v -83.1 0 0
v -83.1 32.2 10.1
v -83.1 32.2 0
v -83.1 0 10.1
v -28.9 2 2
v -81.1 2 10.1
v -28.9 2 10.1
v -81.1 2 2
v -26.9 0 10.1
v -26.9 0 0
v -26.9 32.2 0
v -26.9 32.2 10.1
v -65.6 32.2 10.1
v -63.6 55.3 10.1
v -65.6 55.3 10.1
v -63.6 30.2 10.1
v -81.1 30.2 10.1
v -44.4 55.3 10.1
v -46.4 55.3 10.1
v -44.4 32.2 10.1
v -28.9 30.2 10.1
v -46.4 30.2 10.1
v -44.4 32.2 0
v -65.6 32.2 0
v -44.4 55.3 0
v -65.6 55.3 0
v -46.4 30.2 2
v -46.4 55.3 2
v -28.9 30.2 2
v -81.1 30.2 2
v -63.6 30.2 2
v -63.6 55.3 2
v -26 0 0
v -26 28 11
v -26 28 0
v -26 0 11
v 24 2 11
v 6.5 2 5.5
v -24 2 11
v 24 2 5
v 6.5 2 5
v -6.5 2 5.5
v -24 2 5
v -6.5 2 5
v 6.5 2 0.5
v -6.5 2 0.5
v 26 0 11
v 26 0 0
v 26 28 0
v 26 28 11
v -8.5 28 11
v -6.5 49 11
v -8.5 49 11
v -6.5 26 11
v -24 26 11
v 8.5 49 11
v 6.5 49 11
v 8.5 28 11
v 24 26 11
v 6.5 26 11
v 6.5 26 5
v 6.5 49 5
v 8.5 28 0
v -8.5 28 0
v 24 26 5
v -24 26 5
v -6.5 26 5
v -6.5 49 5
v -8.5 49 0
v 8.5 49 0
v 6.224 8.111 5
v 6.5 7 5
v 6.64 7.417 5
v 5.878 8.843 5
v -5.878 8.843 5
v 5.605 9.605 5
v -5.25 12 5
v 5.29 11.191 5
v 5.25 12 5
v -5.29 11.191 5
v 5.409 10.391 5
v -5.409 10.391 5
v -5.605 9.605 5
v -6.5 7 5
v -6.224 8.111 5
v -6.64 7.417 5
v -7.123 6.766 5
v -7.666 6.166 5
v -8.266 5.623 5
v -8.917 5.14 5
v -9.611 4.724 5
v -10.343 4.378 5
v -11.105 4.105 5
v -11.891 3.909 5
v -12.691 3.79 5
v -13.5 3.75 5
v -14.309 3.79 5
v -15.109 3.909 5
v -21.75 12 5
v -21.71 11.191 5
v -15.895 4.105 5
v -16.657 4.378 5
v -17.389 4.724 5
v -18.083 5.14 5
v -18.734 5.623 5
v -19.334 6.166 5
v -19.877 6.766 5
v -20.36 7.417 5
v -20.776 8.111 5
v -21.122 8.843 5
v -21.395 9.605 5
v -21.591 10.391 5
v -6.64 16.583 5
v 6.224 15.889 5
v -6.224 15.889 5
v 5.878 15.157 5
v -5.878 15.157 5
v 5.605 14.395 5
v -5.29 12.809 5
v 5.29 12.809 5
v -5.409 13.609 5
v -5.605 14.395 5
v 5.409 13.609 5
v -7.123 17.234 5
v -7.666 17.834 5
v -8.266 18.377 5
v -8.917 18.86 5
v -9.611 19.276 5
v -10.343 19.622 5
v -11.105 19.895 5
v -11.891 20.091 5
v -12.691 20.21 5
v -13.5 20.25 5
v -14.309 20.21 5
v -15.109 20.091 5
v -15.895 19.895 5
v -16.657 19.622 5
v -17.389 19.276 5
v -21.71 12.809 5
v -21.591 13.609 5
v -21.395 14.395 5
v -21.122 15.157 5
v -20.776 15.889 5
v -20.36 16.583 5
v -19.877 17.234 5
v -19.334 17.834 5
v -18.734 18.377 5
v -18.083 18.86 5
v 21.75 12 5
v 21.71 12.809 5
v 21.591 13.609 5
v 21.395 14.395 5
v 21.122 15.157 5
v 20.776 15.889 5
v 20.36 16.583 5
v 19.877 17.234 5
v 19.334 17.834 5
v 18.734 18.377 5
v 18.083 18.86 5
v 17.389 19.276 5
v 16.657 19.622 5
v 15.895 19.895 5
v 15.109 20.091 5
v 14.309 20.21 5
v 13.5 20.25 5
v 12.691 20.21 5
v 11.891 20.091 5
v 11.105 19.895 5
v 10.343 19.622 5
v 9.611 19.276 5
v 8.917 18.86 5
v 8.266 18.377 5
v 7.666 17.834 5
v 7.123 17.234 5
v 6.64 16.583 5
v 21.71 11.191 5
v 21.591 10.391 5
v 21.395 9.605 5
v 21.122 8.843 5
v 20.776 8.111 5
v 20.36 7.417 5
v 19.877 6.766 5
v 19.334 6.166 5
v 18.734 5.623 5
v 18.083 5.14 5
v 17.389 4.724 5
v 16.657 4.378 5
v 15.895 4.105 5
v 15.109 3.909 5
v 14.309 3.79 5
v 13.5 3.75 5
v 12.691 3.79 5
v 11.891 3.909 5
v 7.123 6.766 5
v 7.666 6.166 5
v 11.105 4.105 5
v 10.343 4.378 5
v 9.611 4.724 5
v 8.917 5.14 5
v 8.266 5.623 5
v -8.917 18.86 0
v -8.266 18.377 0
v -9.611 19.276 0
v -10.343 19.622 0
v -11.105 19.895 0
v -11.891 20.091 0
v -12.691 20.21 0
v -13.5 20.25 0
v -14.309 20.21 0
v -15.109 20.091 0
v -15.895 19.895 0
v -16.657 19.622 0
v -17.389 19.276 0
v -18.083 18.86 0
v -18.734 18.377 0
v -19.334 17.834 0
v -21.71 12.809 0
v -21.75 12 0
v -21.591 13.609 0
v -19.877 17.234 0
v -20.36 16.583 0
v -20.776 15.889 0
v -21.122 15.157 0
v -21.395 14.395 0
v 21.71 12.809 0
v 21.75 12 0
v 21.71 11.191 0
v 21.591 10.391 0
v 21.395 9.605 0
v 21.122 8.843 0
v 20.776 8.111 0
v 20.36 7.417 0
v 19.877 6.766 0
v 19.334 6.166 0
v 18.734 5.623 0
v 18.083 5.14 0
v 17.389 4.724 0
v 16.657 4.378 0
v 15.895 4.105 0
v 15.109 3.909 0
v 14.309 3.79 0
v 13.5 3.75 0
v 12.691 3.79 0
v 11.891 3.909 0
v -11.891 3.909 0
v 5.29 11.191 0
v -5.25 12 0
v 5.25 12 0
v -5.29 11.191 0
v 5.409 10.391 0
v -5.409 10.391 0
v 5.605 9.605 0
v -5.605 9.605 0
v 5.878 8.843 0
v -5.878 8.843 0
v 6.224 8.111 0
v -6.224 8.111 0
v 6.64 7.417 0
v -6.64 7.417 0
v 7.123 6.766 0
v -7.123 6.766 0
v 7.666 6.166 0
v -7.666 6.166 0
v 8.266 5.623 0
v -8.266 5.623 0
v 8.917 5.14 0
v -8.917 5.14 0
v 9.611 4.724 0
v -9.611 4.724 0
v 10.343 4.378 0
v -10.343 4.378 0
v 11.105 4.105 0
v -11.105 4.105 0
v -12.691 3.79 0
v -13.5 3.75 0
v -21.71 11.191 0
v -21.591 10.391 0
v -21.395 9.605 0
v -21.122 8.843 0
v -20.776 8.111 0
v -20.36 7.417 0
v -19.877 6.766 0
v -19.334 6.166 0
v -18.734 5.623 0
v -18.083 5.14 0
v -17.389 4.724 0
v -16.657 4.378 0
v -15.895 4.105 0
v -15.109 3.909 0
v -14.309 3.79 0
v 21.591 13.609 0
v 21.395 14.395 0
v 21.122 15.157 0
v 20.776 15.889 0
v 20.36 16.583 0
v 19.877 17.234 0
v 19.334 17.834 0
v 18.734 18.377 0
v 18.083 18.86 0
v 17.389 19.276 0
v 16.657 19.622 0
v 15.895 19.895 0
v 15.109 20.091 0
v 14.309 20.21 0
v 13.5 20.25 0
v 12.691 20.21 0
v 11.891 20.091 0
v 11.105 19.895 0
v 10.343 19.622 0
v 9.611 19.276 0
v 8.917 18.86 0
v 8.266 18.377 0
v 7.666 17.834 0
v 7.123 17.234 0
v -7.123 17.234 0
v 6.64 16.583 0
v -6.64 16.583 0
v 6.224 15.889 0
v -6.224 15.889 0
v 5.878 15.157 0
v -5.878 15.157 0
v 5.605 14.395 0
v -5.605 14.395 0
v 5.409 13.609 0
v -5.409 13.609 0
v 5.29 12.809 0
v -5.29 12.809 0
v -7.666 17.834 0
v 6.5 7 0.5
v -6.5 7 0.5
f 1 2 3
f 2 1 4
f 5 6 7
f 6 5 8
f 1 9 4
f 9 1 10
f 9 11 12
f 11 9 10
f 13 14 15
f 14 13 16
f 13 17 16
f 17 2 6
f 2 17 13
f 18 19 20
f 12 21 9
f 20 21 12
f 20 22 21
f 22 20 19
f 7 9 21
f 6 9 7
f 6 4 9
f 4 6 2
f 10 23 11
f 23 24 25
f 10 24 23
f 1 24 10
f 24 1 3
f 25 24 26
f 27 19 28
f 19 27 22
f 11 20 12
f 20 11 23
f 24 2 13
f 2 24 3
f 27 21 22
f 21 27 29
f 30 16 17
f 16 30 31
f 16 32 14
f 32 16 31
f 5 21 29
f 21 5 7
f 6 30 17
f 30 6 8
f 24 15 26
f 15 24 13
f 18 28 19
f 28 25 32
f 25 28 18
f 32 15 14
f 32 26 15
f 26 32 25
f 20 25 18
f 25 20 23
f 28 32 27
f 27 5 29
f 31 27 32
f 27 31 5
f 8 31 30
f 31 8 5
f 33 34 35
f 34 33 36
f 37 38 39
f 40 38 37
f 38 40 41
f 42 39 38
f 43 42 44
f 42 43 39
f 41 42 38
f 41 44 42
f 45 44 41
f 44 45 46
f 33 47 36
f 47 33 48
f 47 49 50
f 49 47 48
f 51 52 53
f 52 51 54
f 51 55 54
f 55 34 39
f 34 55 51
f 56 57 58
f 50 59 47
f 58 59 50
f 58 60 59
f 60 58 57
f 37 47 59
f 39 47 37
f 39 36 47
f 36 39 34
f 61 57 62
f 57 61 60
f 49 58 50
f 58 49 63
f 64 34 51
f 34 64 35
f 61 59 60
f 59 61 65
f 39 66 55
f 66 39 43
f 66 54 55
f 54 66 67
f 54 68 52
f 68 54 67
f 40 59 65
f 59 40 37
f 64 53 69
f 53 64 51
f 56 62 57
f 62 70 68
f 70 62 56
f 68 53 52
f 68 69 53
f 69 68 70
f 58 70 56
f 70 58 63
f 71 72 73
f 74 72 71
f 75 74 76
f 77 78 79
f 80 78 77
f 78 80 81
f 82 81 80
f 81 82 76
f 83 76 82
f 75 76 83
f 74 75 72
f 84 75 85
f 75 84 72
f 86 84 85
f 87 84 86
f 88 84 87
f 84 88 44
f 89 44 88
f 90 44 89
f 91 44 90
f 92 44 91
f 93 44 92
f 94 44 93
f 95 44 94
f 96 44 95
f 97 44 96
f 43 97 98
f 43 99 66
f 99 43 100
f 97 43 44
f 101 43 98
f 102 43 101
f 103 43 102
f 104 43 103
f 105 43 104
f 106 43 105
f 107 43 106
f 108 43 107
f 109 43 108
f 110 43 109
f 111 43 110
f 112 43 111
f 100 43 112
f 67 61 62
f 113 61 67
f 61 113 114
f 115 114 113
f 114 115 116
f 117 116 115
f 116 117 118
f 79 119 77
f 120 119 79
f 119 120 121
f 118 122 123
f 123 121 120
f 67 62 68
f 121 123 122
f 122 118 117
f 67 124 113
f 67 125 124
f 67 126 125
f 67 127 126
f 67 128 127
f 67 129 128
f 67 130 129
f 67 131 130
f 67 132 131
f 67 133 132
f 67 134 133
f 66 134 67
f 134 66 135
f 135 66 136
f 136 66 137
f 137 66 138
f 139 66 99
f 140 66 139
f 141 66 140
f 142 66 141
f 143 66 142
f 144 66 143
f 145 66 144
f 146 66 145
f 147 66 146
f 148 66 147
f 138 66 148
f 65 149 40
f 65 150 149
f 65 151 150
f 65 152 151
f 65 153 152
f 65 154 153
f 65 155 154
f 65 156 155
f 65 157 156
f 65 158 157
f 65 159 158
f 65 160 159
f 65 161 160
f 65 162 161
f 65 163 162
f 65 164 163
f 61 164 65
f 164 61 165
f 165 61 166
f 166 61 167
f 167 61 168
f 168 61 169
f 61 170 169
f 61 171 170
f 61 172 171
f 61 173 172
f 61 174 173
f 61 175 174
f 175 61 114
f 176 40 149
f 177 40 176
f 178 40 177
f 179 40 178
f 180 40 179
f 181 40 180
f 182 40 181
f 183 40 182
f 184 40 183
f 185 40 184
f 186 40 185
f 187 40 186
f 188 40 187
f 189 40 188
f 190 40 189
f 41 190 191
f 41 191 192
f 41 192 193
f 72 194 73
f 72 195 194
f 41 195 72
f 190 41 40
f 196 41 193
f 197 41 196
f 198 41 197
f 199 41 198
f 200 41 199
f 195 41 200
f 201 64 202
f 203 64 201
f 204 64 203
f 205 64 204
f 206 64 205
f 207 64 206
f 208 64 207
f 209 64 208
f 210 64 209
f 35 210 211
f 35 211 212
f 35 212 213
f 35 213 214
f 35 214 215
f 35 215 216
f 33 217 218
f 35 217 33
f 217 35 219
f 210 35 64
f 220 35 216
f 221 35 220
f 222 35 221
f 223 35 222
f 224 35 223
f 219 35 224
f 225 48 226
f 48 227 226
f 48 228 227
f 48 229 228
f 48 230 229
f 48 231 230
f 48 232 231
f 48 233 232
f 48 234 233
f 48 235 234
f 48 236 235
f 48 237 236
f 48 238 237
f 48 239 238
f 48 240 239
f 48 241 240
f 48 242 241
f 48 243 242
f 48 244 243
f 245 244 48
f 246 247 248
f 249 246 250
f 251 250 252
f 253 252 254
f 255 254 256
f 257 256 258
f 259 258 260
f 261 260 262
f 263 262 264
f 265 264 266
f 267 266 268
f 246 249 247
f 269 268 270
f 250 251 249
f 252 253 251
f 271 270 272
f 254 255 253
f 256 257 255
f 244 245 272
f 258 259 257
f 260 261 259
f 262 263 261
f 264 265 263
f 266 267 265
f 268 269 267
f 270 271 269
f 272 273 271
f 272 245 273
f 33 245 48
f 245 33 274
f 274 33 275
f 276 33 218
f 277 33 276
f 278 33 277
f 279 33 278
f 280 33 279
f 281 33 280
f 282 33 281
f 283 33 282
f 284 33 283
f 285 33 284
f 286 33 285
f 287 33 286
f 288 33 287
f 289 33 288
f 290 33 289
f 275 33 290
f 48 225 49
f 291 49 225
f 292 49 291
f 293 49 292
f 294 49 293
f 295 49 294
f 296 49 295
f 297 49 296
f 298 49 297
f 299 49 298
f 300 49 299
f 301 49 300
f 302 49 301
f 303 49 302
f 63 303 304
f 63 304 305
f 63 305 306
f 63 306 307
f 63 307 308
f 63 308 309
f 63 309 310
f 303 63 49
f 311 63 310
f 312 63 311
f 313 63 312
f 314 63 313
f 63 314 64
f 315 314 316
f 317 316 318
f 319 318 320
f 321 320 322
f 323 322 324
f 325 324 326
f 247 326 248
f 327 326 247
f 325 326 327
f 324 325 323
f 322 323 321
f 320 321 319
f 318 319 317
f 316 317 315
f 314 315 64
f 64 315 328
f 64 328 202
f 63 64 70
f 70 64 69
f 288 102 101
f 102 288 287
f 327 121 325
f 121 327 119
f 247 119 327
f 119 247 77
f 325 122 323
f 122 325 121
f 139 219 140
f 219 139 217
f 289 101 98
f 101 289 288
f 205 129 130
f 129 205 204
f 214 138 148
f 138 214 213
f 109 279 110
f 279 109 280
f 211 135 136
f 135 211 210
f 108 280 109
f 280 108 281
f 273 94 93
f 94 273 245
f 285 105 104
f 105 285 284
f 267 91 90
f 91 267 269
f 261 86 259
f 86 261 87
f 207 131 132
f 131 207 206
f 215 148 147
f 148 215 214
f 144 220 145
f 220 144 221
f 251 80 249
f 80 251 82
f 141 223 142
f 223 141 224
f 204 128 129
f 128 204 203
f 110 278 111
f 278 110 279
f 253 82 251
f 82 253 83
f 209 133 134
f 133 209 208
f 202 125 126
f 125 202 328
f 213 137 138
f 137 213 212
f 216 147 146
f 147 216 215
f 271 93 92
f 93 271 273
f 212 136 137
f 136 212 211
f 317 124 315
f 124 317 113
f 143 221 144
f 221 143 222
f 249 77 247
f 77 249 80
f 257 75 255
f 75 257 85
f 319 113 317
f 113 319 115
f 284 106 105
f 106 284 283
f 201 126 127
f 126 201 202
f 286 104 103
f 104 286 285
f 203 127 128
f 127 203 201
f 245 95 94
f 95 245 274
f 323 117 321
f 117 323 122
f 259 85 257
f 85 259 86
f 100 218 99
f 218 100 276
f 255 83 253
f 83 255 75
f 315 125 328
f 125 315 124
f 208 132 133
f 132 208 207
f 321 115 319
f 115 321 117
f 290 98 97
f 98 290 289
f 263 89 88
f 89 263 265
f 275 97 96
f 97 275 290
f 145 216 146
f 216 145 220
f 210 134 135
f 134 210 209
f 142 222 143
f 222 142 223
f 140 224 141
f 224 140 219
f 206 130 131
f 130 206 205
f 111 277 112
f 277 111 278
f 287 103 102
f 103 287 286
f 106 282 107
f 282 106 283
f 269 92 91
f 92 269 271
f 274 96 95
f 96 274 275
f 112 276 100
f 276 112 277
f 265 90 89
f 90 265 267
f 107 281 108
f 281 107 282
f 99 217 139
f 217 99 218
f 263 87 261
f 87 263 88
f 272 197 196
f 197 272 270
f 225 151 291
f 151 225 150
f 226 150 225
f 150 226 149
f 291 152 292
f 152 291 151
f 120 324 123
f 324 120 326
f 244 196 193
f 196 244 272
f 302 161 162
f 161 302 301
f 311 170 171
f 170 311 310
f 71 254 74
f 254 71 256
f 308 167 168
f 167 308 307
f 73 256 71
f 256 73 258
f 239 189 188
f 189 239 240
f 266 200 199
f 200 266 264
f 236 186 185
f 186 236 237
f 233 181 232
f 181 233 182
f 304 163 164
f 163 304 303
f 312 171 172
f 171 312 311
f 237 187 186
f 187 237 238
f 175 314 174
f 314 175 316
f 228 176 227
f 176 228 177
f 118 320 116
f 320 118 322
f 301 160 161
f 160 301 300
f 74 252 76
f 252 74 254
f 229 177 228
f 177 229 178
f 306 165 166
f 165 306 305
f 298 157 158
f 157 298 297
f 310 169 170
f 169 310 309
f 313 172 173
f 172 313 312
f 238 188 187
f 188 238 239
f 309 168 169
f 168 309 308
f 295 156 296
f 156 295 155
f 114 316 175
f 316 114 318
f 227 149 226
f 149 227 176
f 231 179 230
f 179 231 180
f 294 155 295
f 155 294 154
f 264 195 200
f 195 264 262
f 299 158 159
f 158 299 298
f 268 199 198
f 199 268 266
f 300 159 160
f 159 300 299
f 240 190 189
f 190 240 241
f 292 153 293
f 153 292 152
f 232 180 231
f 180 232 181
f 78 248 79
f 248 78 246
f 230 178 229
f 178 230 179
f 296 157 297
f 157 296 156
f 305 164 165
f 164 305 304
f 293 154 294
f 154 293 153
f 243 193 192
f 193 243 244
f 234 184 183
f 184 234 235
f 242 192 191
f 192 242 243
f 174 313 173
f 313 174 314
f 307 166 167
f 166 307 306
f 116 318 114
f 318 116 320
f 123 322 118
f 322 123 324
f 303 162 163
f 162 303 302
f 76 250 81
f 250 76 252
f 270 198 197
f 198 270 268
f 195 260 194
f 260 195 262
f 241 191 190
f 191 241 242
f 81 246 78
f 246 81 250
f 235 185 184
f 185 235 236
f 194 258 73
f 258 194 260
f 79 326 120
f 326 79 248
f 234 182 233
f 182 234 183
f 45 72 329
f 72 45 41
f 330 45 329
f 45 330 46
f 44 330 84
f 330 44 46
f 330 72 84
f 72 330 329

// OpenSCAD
color("red")
//translate([-0,-2,10]) rotate([0,180,0])
translate([-55,-0,0]) 
HCSR04lid(2,2.1);
translate([0,-0,3.0]) 
HCSR04case(5);

module HCSR04case(dicke)    
{
  difference()
  {
      //translate([80,0,1]) 
        //rotate([0,0,180]) translate([-51,-2,-1])  
       HCSR04lid(dicke,0);
      //cube([50,2,25]);

    union()
    {
      translate([-23.5,0,2.5]) 
      //rotate([90,0,0])
      {
        translate([10,12,-12]) cylinder(d=16.5,h=15,$fn=64);
        translate([37,12,-12]) cylinder(d=16.5,h=15,$fn=64);
        translate([17,2,-5]) cube([13,5,5]);
      }

    }
  }


}

module HCSR04lid(deckeldicke,ausweitung)
{
  breite = 52; hoehe = 28;
  sbreite = 17; shoehe = 21;
  mittex = breite/2; mittey= hoehe/2;
  smittex = sbreite/2;
  translate([breite/2,0,0])
  rotate([90,0,180])
  union()
  {
    translate([-ausweitung,0,0]) cube([breite+2*ausweitung,8+ausweitung,2]);
    translate([-ausweitung,0,hoehe-2+2*ausweitung]) 
      cube([mittex-smittex+2,8+ausweitung,2]);
    translate([mittex+smittex-2+ausweitung,0,hoehe-2+2*ausweitung]) cube([mittex-smittex+ausweitung/2,8+ausweitung,2]);
    translate([-ausweitung,0,0]) cube([2,8+ausweitung,hoehe+2*ausweitung]);
    translate([breite-2+ausweitung,0,0]) cube([2,8+ausweitung,hoehe+2*ausweitung]);
    translate([mittex+smittex-2+ausweitung,0,hoehe+2*ausweitung]) cube([2,8+ausweitung,shoehe+ausweitung]);
    translate([mittex-smittex-ausweitung,0,hoehe+2*ausweitung]) cube([2,8+ausweitung,shoehe+ausweitung]);
    //fond
    translate([-ausweitung,2-deckeldicke ,0]) cube([breite+2*ausweitung,deckeldicke,hoehe+2*ausweitung]);
    translate([(mittex-sbreite/2)-ausweitung,2-deckeldicke,hoehe+2*ausweitung]) cube([sbreite+2*ausweitung,deckeldicke,shoehe+ausweitung]);   
  }
}
